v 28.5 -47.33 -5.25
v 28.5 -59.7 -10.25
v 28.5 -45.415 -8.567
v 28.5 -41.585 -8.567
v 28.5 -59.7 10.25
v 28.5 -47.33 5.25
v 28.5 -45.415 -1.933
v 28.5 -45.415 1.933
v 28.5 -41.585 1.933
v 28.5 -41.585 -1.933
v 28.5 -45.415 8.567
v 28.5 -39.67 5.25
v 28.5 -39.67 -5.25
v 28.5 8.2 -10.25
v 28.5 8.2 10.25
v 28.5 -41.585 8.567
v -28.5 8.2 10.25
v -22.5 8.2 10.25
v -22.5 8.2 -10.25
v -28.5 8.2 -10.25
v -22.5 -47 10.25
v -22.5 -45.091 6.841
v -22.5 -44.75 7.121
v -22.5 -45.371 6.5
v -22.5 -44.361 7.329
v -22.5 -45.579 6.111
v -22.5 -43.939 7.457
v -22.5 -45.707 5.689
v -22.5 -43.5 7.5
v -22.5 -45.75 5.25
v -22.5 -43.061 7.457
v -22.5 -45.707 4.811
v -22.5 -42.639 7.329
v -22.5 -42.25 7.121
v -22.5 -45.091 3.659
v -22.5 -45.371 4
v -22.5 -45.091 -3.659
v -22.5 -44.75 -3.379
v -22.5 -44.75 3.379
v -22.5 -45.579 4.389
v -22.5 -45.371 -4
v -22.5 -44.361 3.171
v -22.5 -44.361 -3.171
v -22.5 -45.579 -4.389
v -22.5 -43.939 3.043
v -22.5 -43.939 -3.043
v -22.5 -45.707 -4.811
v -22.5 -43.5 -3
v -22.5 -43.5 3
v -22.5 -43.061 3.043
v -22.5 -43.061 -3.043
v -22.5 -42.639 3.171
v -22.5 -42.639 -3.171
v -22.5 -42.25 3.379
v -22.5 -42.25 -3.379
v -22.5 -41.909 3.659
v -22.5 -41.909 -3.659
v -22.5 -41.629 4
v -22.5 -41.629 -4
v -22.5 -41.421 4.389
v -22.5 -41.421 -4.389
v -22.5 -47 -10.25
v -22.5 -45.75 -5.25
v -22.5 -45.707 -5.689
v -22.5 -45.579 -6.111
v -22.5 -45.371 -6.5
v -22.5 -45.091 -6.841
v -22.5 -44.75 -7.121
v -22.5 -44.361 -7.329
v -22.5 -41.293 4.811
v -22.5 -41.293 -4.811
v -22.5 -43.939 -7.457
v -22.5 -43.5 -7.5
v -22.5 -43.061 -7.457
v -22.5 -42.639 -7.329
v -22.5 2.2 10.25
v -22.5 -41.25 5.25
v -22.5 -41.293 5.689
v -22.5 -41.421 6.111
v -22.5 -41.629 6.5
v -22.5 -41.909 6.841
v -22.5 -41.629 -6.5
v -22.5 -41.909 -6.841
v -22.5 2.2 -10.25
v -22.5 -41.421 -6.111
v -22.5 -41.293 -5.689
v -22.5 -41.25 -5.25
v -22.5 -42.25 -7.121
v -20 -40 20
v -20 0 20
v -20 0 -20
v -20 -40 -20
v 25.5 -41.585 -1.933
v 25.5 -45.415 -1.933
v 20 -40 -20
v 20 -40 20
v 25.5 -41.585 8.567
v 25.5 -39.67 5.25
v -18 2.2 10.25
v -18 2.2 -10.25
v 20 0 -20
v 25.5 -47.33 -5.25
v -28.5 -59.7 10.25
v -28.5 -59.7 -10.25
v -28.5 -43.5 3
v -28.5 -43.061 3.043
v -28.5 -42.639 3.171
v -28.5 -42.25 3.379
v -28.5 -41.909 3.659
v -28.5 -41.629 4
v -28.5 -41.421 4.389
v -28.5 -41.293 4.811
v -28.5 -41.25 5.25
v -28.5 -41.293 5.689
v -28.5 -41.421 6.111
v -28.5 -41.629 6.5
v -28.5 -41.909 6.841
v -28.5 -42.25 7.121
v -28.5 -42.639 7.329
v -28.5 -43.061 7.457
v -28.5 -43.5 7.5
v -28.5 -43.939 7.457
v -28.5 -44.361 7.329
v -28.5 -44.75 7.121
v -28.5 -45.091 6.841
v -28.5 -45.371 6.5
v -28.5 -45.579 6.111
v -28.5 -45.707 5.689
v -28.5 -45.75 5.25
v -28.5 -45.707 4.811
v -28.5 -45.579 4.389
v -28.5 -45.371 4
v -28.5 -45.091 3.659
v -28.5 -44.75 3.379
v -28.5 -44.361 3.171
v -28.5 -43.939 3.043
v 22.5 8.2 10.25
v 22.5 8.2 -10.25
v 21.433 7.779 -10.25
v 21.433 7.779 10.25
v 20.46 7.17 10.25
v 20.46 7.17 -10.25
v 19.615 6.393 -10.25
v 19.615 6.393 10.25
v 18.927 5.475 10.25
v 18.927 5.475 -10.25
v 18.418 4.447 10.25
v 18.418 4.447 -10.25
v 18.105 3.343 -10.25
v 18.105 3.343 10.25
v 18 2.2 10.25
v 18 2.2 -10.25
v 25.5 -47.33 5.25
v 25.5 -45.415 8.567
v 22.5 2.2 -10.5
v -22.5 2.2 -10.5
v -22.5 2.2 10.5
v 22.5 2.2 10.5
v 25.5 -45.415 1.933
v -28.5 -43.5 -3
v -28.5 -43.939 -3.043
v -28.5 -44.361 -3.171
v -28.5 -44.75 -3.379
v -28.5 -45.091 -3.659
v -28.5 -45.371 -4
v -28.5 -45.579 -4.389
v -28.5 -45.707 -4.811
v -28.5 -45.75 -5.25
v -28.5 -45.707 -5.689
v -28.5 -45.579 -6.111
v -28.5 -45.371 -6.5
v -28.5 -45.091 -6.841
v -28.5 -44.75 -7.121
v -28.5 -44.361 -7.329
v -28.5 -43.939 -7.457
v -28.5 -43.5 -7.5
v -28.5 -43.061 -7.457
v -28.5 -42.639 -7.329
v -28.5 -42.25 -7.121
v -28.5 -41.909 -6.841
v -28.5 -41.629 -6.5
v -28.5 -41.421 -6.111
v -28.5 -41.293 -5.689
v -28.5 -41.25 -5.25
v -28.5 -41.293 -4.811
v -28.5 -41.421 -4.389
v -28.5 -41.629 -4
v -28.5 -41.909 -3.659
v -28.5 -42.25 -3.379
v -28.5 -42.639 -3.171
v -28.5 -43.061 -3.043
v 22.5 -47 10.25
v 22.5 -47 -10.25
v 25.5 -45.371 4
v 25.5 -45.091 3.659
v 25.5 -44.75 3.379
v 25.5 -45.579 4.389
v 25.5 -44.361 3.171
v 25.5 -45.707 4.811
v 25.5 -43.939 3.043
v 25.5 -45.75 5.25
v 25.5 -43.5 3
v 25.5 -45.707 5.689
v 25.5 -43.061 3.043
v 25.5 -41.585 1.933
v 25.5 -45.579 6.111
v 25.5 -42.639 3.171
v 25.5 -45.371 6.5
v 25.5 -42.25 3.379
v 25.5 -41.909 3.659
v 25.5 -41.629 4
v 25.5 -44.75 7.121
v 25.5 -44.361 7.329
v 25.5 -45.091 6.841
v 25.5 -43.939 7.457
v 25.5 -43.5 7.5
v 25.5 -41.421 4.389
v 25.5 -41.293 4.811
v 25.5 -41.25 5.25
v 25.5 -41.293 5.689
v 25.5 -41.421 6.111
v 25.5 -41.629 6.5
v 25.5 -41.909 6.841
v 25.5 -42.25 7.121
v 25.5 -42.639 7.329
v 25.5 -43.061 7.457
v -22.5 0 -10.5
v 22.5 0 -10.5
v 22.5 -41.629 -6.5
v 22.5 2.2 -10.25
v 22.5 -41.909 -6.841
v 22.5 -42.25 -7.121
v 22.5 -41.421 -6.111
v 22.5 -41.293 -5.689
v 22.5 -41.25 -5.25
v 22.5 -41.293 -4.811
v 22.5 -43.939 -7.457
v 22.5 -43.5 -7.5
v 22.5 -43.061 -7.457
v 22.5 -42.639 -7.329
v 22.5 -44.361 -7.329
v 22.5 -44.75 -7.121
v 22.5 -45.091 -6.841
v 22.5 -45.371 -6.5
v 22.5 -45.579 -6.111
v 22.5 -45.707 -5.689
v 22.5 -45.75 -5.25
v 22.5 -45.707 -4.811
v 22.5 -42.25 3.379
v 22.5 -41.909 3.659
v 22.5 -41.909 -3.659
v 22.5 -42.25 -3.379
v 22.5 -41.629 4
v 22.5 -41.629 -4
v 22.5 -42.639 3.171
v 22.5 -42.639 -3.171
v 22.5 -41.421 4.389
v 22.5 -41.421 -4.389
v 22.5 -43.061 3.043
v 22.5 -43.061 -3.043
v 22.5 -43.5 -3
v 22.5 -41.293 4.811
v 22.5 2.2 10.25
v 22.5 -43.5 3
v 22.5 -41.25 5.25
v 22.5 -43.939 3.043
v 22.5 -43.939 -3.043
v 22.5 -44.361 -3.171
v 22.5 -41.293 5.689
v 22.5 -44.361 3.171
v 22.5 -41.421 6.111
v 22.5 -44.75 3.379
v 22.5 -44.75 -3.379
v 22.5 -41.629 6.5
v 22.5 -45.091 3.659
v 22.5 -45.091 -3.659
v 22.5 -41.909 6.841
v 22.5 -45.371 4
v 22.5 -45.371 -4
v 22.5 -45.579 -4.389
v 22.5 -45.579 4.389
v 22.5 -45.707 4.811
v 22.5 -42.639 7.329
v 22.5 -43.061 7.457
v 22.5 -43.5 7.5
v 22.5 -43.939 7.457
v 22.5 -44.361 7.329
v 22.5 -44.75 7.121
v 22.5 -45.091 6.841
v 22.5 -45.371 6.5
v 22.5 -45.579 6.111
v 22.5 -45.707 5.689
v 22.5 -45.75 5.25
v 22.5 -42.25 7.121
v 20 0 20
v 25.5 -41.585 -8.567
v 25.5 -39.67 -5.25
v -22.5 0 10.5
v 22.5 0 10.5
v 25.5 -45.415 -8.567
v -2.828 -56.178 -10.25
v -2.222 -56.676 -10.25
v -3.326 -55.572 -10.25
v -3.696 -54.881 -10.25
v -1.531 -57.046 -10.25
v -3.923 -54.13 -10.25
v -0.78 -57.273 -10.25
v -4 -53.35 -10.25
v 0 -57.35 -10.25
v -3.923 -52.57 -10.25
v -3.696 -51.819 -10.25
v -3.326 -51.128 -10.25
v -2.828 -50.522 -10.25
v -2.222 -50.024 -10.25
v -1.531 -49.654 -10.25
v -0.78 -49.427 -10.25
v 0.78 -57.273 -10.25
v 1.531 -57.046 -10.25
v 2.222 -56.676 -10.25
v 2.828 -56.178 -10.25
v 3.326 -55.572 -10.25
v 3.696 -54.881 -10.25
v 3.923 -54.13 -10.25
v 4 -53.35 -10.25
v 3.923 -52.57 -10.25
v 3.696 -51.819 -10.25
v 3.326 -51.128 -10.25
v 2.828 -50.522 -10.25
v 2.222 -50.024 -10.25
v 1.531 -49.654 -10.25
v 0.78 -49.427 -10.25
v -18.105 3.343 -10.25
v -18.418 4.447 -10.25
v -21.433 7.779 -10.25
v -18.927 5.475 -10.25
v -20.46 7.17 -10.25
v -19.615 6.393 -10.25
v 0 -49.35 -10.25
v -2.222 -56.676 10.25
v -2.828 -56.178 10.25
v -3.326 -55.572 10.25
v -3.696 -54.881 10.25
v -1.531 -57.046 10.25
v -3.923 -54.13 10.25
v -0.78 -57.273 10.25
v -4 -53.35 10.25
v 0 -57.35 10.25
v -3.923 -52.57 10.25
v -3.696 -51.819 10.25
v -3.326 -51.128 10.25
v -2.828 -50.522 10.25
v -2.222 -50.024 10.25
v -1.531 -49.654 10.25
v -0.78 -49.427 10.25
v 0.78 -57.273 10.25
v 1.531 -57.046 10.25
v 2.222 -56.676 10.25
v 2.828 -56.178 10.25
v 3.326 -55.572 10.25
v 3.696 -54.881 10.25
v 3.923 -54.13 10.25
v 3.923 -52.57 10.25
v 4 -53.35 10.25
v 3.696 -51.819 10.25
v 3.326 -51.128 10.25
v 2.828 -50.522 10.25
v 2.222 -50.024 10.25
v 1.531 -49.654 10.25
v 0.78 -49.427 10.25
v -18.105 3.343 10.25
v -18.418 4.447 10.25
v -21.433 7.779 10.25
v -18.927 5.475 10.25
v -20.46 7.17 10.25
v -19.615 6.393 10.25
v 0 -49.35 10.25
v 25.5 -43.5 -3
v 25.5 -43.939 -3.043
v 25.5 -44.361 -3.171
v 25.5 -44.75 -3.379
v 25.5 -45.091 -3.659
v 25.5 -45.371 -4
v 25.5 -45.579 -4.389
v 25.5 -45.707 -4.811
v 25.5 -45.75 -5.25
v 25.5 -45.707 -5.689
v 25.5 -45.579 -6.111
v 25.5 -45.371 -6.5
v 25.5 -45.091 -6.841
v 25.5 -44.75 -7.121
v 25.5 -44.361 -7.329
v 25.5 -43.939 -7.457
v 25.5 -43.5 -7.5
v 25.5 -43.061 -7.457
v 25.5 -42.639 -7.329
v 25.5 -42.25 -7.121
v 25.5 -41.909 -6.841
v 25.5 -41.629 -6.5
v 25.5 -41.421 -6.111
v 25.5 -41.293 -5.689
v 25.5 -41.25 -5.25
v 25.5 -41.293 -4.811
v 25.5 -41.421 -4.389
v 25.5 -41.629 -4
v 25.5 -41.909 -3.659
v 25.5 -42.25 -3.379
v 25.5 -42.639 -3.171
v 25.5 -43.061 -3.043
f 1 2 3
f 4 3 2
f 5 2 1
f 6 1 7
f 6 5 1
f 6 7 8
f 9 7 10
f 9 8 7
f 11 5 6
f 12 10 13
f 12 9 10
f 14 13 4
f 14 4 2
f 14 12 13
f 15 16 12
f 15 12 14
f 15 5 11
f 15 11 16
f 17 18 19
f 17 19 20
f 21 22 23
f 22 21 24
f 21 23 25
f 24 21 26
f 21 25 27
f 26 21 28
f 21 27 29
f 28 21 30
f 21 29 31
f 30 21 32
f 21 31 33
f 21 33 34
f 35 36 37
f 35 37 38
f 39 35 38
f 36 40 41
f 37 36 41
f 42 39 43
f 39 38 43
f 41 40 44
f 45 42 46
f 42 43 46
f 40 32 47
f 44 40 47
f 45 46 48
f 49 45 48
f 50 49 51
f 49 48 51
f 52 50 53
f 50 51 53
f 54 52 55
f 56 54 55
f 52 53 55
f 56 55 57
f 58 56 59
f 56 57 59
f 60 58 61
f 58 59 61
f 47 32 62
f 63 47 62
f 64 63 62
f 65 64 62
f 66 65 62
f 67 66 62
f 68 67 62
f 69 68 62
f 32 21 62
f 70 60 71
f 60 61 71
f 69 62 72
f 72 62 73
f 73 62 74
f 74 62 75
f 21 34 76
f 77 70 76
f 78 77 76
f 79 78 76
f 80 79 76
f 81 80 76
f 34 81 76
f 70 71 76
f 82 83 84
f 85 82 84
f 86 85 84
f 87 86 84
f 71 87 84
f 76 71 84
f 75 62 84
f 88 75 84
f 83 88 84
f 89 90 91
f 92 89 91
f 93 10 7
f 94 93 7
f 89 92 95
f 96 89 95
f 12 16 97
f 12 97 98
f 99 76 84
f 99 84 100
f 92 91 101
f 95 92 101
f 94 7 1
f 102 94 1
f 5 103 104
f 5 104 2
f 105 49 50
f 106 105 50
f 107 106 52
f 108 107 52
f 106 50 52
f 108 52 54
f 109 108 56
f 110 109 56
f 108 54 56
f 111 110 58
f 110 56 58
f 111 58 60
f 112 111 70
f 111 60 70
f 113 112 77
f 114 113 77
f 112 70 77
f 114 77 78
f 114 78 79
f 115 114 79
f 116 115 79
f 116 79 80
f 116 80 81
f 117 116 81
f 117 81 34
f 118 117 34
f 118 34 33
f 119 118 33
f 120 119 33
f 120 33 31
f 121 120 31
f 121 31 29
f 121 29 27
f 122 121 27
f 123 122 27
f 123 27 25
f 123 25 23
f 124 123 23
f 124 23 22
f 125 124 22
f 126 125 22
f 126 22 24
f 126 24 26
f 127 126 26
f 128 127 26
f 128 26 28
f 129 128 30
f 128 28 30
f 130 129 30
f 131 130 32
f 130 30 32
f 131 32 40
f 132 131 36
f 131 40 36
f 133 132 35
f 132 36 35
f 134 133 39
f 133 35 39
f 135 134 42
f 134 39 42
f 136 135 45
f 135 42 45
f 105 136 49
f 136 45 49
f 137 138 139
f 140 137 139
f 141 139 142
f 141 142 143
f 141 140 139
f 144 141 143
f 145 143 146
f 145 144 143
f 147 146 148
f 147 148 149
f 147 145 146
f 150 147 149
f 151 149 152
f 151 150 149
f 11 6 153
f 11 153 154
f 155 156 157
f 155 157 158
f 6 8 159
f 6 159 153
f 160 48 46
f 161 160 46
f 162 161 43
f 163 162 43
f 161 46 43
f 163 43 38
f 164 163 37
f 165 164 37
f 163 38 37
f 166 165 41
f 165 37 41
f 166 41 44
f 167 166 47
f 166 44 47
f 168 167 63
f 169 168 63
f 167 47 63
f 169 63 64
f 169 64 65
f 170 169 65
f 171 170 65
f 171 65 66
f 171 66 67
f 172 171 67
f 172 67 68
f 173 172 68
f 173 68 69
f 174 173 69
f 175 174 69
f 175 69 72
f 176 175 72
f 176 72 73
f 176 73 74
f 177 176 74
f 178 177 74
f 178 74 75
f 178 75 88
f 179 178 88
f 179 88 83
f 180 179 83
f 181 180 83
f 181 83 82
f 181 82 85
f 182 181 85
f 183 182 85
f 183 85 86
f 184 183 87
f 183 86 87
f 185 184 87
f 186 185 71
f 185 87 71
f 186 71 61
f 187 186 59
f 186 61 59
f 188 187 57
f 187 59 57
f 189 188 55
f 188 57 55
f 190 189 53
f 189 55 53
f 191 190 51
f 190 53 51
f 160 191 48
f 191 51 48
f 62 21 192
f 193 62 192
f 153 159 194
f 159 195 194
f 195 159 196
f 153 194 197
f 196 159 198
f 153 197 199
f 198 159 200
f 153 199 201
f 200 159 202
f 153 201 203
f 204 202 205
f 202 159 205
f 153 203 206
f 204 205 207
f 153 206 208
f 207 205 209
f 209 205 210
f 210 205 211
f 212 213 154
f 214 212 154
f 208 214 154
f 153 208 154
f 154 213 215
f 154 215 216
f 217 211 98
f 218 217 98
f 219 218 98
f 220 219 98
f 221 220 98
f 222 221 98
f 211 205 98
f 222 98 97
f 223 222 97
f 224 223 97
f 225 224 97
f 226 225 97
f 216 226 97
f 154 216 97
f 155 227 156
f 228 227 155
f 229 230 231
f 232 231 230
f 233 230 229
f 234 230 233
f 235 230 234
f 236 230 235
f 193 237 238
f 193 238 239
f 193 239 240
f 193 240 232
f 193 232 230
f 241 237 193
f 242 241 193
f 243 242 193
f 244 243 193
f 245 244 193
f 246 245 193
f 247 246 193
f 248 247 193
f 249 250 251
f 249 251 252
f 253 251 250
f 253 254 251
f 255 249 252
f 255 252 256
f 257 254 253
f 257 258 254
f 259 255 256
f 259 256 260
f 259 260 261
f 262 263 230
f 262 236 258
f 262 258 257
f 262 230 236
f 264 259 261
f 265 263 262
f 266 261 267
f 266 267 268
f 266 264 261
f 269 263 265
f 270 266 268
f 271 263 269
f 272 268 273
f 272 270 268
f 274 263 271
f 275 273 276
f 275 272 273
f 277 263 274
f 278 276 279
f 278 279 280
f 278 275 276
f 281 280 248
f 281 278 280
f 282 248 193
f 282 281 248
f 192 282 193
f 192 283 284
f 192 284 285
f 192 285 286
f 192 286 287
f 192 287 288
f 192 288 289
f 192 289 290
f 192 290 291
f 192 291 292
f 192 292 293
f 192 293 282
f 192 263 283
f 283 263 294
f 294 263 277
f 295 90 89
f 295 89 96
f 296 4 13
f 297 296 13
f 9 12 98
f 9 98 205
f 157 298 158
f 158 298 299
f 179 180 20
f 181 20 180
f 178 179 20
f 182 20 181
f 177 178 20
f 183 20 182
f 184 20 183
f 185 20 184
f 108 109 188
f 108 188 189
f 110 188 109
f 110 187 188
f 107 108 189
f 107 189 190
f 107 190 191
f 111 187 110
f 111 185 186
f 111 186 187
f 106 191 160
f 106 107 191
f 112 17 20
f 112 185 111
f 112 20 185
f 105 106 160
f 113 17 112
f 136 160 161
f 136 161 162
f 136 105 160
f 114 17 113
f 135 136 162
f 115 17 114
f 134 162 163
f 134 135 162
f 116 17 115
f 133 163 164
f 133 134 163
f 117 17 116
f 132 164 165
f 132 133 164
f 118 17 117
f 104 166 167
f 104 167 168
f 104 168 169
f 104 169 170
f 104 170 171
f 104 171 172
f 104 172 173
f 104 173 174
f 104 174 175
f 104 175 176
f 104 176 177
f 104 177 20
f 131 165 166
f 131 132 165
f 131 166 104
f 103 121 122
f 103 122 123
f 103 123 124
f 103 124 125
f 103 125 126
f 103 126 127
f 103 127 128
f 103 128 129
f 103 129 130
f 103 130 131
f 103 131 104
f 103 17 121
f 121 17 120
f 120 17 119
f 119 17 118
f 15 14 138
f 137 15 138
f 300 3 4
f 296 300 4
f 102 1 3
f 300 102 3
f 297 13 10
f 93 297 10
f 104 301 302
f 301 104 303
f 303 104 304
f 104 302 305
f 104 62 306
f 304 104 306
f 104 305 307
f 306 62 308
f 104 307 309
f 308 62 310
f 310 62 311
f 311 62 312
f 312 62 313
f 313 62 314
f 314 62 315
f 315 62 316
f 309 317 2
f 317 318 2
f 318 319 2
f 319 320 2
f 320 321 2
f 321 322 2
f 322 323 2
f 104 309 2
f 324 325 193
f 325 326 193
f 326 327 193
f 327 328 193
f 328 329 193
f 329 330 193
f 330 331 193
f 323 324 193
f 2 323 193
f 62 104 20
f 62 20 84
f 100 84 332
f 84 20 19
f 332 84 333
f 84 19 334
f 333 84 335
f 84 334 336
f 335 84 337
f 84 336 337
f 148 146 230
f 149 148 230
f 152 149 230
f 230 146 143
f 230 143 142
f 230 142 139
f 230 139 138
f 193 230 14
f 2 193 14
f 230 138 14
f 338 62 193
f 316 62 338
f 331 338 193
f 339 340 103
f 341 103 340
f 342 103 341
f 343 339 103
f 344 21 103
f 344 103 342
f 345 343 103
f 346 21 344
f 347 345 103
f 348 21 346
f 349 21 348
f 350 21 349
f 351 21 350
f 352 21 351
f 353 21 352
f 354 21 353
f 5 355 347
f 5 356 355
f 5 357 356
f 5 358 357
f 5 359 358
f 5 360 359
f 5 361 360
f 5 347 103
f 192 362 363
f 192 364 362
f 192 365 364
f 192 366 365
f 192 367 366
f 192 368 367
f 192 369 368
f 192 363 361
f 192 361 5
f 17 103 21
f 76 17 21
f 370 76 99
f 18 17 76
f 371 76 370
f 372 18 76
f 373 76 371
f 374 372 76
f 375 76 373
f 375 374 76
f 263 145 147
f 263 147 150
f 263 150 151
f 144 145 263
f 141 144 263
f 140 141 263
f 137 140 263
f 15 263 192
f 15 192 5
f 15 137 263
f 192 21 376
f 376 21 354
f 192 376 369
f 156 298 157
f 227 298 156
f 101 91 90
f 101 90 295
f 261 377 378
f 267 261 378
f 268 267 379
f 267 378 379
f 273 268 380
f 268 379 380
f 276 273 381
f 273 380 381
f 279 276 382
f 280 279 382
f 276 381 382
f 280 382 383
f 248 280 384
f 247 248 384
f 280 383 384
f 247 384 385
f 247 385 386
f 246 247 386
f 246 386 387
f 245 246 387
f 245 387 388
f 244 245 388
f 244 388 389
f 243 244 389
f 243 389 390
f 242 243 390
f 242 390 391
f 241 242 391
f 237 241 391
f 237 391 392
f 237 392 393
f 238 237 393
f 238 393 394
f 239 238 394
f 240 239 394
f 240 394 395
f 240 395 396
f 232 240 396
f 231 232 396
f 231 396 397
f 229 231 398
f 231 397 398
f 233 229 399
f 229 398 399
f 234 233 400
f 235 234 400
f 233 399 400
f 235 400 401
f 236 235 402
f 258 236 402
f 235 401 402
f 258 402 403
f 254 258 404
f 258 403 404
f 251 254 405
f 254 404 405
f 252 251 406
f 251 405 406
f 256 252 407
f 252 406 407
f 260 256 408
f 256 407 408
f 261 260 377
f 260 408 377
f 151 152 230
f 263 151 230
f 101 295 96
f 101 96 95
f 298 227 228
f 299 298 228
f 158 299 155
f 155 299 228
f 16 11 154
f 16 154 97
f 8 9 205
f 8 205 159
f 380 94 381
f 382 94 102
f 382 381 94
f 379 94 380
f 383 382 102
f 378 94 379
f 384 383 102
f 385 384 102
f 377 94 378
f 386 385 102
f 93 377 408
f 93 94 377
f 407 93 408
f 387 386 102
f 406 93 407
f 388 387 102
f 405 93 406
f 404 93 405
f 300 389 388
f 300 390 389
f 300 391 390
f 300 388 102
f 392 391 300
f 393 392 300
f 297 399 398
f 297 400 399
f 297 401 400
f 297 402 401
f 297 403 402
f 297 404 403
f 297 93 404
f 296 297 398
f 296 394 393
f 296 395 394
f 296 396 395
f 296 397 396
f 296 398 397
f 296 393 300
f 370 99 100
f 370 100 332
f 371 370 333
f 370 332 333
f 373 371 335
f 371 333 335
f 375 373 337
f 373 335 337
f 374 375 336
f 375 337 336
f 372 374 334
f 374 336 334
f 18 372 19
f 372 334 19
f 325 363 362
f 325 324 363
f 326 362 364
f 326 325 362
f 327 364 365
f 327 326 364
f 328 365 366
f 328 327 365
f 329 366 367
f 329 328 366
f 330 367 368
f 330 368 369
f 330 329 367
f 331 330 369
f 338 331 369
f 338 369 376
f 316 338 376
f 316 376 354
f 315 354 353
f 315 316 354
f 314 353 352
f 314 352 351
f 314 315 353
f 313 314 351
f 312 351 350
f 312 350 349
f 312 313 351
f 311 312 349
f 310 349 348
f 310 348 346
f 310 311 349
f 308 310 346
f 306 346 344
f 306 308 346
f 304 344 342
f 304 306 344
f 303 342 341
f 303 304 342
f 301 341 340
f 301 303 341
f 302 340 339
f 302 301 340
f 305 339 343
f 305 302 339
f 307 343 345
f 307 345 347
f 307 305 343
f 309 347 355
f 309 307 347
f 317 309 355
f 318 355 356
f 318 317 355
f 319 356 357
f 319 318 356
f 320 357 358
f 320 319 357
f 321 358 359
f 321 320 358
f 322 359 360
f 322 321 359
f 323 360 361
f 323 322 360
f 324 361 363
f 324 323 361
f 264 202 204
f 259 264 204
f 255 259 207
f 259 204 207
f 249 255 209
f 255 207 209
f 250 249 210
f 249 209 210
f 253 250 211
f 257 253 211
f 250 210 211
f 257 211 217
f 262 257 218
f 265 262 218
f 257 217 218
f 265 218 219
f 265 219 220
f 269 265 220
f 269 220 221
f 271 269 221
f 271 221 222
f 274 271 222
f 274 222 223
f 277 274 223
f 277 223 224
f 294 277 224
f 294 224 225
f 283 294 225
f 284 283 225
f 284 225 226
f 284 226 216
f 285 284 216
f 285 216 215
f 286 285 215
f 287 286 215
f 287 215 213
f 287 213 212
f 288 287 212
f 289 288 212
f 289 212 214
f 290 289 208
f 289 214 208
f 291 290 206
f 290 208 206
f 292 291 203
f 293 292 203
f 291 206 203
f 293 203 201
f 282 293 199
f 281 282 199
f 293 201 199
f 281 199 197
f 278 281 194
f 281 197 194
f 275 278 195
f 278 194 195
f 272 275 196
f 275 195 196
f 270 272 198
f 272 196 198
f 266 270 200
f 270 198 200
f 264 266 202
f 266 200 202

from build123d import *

# Parameters (mm, degrees)
SKETCH1_W           = 45
SKETCH1_H           = 21
BOSS_EXTRUDE1_DEPTH = 2.2
SKETCH2_W           = 40
SKETCH2_H           = 40
BOSS_EXTRUDE2_DEPTH = 40
SKETCH3_W           = 45
SKETCH3_H           = 12.7
SKETCH3_R           = 4
BOSS_EXTRUDE3_DEPTH = 10.25
SKETCH6_R           = 2.25
CUT_EXTRUDE1_DEPTH  = 85.929912281
CUT_EXTRUDE2_DEPTH  = 3


with BuildPart() as part:
    # Sketch1 → Boss-Extrude1 (new body)
    with BuildSketch(Plane(origin=(0, 0, 0), x_dir=(1, 0, 0), z_dir=(0, 1, 0))):
        Rectangle(SKETCH1_W, SKETCH1_H)
    extrude(amount=BOSS_EXTRUDE1_DEPTH)


with BuildPart() as body_2:
    # Sketch2 → Boss-Extrude2 (new body)
    with BuildSketch(Plane(origin=(0, 0, 0), x_dir=(1, 0, 0), z_dir=(0, 1, 0))):
        Rectangle(SKETCH2_W, SKETCH2_H)
    extrude(amount=-BOSS_EXTRUDE2_DEPTH)


with BuildPart() as body_3:
    # Sketch3 → Boss-Extrude3 (new, symmetric)
    # profile 1 of 3: a face of its own
    with BuildSketch(Plane.XY):
        with Locations((0, -53.35)):
            Rectangle(SKETCH3_W, SKETCH3_H)
        with Locations((0, -53.35)):
            Circle(SKETCH3_R, mode=Mode.SUBTRACT)
    # profile 2 of 3: a face of its own
    with BuildSketch(Plane.XY):
        with BuildLine():
            Line((-28.5, -59.7), (-22.5, -59.7))
            Line((-22.5, -59.7), (-22.5, -47))
            Line((-22.5, -47), (-22.5, 0))
            Line((-22.5, 0), (-22.5, 2.2))
            Line((-22.5, 2.2), (-18, 2.2))
            ThreePointArc((-18, 2.2), (-19.25, 5.95), (-22.5, 8.2))
            Line((-22.5, 8.2), (-28.5, 8.2))
            Line((-28.5, 8.2), (-28.5, 0))
            Line((-28.5, 0), (-28.5, -59.7))
        make_face()
    # profile 3 of 3: a face of its own
    with BuildSketch(Plane.XY):
        with BuildLine():
            Line((22.5, -47), (22.5, -59.7))
            Line((22.5, -59.7), (28.5, -59.7))
            Line((28.5, -59.7), (28.5, 0))
            Line((28.5, 0), (28.5, 8.2))
            Line((28.5, 8.2), (22.5, 8.2))
            ThreePointArc((22.5, 8.2), (19.25, 5.95), (18, 2.2))
            Line((18, 2.2), (22.5, 2.2))
            Line((22.5, 2.2), (22.5, 0))
            Line((22.5, 0), (22.5, -47))
        make_face()
    extrude(amount=BOSS_EXTRUDE3_DEPTH, both=True)

    # Sketch6 → Cut-Extrude1 (cut, through all)
    with BuildSketch(Plane(origin=(28.5, 0, 0), x_dir=(0, 0, -1), z_dir=(1, 0, 0))):
        with Locations((-5.25, -43.5)):
            Circle(SKETCH6_R)
        with Locations(Location((5.25, -43.5, 0), (0, 0, 180))):
            Circle(SKETCH6_R)
    extrude(amount=-CUT_EXTRUDE1_DEPTH, mode=Mode.SUBTRACT)

    # Sketch7 → Cut-Extrude2 (cut)
    with BuildSketch(Plane(origin=(28.5, 0, 0), x_dir=(0, 0, -1), z_dir=(1, 0, 0))):
        Polygon((-8.566877296, -41.585), (-5.25, -39.67), (-1.933122704, -41.585), (-1.933122704, -45.415), (-5.25, -47.33), (-8.566877296, -45.415), align=None)
        Polygon((1.933122704, -41.585), (1.933122704, -45.415), (5.25, -47.33), (8.566877296, -45.415), (8.566877296, -41.585), (5.25, -39.67), align=None)
    extrude(amount=-CUT_EXTRUDE2_DEPTH, mode=Mode.SUBTRACT)


solid = Compound([part.part, body_2.part, body_3.part])
